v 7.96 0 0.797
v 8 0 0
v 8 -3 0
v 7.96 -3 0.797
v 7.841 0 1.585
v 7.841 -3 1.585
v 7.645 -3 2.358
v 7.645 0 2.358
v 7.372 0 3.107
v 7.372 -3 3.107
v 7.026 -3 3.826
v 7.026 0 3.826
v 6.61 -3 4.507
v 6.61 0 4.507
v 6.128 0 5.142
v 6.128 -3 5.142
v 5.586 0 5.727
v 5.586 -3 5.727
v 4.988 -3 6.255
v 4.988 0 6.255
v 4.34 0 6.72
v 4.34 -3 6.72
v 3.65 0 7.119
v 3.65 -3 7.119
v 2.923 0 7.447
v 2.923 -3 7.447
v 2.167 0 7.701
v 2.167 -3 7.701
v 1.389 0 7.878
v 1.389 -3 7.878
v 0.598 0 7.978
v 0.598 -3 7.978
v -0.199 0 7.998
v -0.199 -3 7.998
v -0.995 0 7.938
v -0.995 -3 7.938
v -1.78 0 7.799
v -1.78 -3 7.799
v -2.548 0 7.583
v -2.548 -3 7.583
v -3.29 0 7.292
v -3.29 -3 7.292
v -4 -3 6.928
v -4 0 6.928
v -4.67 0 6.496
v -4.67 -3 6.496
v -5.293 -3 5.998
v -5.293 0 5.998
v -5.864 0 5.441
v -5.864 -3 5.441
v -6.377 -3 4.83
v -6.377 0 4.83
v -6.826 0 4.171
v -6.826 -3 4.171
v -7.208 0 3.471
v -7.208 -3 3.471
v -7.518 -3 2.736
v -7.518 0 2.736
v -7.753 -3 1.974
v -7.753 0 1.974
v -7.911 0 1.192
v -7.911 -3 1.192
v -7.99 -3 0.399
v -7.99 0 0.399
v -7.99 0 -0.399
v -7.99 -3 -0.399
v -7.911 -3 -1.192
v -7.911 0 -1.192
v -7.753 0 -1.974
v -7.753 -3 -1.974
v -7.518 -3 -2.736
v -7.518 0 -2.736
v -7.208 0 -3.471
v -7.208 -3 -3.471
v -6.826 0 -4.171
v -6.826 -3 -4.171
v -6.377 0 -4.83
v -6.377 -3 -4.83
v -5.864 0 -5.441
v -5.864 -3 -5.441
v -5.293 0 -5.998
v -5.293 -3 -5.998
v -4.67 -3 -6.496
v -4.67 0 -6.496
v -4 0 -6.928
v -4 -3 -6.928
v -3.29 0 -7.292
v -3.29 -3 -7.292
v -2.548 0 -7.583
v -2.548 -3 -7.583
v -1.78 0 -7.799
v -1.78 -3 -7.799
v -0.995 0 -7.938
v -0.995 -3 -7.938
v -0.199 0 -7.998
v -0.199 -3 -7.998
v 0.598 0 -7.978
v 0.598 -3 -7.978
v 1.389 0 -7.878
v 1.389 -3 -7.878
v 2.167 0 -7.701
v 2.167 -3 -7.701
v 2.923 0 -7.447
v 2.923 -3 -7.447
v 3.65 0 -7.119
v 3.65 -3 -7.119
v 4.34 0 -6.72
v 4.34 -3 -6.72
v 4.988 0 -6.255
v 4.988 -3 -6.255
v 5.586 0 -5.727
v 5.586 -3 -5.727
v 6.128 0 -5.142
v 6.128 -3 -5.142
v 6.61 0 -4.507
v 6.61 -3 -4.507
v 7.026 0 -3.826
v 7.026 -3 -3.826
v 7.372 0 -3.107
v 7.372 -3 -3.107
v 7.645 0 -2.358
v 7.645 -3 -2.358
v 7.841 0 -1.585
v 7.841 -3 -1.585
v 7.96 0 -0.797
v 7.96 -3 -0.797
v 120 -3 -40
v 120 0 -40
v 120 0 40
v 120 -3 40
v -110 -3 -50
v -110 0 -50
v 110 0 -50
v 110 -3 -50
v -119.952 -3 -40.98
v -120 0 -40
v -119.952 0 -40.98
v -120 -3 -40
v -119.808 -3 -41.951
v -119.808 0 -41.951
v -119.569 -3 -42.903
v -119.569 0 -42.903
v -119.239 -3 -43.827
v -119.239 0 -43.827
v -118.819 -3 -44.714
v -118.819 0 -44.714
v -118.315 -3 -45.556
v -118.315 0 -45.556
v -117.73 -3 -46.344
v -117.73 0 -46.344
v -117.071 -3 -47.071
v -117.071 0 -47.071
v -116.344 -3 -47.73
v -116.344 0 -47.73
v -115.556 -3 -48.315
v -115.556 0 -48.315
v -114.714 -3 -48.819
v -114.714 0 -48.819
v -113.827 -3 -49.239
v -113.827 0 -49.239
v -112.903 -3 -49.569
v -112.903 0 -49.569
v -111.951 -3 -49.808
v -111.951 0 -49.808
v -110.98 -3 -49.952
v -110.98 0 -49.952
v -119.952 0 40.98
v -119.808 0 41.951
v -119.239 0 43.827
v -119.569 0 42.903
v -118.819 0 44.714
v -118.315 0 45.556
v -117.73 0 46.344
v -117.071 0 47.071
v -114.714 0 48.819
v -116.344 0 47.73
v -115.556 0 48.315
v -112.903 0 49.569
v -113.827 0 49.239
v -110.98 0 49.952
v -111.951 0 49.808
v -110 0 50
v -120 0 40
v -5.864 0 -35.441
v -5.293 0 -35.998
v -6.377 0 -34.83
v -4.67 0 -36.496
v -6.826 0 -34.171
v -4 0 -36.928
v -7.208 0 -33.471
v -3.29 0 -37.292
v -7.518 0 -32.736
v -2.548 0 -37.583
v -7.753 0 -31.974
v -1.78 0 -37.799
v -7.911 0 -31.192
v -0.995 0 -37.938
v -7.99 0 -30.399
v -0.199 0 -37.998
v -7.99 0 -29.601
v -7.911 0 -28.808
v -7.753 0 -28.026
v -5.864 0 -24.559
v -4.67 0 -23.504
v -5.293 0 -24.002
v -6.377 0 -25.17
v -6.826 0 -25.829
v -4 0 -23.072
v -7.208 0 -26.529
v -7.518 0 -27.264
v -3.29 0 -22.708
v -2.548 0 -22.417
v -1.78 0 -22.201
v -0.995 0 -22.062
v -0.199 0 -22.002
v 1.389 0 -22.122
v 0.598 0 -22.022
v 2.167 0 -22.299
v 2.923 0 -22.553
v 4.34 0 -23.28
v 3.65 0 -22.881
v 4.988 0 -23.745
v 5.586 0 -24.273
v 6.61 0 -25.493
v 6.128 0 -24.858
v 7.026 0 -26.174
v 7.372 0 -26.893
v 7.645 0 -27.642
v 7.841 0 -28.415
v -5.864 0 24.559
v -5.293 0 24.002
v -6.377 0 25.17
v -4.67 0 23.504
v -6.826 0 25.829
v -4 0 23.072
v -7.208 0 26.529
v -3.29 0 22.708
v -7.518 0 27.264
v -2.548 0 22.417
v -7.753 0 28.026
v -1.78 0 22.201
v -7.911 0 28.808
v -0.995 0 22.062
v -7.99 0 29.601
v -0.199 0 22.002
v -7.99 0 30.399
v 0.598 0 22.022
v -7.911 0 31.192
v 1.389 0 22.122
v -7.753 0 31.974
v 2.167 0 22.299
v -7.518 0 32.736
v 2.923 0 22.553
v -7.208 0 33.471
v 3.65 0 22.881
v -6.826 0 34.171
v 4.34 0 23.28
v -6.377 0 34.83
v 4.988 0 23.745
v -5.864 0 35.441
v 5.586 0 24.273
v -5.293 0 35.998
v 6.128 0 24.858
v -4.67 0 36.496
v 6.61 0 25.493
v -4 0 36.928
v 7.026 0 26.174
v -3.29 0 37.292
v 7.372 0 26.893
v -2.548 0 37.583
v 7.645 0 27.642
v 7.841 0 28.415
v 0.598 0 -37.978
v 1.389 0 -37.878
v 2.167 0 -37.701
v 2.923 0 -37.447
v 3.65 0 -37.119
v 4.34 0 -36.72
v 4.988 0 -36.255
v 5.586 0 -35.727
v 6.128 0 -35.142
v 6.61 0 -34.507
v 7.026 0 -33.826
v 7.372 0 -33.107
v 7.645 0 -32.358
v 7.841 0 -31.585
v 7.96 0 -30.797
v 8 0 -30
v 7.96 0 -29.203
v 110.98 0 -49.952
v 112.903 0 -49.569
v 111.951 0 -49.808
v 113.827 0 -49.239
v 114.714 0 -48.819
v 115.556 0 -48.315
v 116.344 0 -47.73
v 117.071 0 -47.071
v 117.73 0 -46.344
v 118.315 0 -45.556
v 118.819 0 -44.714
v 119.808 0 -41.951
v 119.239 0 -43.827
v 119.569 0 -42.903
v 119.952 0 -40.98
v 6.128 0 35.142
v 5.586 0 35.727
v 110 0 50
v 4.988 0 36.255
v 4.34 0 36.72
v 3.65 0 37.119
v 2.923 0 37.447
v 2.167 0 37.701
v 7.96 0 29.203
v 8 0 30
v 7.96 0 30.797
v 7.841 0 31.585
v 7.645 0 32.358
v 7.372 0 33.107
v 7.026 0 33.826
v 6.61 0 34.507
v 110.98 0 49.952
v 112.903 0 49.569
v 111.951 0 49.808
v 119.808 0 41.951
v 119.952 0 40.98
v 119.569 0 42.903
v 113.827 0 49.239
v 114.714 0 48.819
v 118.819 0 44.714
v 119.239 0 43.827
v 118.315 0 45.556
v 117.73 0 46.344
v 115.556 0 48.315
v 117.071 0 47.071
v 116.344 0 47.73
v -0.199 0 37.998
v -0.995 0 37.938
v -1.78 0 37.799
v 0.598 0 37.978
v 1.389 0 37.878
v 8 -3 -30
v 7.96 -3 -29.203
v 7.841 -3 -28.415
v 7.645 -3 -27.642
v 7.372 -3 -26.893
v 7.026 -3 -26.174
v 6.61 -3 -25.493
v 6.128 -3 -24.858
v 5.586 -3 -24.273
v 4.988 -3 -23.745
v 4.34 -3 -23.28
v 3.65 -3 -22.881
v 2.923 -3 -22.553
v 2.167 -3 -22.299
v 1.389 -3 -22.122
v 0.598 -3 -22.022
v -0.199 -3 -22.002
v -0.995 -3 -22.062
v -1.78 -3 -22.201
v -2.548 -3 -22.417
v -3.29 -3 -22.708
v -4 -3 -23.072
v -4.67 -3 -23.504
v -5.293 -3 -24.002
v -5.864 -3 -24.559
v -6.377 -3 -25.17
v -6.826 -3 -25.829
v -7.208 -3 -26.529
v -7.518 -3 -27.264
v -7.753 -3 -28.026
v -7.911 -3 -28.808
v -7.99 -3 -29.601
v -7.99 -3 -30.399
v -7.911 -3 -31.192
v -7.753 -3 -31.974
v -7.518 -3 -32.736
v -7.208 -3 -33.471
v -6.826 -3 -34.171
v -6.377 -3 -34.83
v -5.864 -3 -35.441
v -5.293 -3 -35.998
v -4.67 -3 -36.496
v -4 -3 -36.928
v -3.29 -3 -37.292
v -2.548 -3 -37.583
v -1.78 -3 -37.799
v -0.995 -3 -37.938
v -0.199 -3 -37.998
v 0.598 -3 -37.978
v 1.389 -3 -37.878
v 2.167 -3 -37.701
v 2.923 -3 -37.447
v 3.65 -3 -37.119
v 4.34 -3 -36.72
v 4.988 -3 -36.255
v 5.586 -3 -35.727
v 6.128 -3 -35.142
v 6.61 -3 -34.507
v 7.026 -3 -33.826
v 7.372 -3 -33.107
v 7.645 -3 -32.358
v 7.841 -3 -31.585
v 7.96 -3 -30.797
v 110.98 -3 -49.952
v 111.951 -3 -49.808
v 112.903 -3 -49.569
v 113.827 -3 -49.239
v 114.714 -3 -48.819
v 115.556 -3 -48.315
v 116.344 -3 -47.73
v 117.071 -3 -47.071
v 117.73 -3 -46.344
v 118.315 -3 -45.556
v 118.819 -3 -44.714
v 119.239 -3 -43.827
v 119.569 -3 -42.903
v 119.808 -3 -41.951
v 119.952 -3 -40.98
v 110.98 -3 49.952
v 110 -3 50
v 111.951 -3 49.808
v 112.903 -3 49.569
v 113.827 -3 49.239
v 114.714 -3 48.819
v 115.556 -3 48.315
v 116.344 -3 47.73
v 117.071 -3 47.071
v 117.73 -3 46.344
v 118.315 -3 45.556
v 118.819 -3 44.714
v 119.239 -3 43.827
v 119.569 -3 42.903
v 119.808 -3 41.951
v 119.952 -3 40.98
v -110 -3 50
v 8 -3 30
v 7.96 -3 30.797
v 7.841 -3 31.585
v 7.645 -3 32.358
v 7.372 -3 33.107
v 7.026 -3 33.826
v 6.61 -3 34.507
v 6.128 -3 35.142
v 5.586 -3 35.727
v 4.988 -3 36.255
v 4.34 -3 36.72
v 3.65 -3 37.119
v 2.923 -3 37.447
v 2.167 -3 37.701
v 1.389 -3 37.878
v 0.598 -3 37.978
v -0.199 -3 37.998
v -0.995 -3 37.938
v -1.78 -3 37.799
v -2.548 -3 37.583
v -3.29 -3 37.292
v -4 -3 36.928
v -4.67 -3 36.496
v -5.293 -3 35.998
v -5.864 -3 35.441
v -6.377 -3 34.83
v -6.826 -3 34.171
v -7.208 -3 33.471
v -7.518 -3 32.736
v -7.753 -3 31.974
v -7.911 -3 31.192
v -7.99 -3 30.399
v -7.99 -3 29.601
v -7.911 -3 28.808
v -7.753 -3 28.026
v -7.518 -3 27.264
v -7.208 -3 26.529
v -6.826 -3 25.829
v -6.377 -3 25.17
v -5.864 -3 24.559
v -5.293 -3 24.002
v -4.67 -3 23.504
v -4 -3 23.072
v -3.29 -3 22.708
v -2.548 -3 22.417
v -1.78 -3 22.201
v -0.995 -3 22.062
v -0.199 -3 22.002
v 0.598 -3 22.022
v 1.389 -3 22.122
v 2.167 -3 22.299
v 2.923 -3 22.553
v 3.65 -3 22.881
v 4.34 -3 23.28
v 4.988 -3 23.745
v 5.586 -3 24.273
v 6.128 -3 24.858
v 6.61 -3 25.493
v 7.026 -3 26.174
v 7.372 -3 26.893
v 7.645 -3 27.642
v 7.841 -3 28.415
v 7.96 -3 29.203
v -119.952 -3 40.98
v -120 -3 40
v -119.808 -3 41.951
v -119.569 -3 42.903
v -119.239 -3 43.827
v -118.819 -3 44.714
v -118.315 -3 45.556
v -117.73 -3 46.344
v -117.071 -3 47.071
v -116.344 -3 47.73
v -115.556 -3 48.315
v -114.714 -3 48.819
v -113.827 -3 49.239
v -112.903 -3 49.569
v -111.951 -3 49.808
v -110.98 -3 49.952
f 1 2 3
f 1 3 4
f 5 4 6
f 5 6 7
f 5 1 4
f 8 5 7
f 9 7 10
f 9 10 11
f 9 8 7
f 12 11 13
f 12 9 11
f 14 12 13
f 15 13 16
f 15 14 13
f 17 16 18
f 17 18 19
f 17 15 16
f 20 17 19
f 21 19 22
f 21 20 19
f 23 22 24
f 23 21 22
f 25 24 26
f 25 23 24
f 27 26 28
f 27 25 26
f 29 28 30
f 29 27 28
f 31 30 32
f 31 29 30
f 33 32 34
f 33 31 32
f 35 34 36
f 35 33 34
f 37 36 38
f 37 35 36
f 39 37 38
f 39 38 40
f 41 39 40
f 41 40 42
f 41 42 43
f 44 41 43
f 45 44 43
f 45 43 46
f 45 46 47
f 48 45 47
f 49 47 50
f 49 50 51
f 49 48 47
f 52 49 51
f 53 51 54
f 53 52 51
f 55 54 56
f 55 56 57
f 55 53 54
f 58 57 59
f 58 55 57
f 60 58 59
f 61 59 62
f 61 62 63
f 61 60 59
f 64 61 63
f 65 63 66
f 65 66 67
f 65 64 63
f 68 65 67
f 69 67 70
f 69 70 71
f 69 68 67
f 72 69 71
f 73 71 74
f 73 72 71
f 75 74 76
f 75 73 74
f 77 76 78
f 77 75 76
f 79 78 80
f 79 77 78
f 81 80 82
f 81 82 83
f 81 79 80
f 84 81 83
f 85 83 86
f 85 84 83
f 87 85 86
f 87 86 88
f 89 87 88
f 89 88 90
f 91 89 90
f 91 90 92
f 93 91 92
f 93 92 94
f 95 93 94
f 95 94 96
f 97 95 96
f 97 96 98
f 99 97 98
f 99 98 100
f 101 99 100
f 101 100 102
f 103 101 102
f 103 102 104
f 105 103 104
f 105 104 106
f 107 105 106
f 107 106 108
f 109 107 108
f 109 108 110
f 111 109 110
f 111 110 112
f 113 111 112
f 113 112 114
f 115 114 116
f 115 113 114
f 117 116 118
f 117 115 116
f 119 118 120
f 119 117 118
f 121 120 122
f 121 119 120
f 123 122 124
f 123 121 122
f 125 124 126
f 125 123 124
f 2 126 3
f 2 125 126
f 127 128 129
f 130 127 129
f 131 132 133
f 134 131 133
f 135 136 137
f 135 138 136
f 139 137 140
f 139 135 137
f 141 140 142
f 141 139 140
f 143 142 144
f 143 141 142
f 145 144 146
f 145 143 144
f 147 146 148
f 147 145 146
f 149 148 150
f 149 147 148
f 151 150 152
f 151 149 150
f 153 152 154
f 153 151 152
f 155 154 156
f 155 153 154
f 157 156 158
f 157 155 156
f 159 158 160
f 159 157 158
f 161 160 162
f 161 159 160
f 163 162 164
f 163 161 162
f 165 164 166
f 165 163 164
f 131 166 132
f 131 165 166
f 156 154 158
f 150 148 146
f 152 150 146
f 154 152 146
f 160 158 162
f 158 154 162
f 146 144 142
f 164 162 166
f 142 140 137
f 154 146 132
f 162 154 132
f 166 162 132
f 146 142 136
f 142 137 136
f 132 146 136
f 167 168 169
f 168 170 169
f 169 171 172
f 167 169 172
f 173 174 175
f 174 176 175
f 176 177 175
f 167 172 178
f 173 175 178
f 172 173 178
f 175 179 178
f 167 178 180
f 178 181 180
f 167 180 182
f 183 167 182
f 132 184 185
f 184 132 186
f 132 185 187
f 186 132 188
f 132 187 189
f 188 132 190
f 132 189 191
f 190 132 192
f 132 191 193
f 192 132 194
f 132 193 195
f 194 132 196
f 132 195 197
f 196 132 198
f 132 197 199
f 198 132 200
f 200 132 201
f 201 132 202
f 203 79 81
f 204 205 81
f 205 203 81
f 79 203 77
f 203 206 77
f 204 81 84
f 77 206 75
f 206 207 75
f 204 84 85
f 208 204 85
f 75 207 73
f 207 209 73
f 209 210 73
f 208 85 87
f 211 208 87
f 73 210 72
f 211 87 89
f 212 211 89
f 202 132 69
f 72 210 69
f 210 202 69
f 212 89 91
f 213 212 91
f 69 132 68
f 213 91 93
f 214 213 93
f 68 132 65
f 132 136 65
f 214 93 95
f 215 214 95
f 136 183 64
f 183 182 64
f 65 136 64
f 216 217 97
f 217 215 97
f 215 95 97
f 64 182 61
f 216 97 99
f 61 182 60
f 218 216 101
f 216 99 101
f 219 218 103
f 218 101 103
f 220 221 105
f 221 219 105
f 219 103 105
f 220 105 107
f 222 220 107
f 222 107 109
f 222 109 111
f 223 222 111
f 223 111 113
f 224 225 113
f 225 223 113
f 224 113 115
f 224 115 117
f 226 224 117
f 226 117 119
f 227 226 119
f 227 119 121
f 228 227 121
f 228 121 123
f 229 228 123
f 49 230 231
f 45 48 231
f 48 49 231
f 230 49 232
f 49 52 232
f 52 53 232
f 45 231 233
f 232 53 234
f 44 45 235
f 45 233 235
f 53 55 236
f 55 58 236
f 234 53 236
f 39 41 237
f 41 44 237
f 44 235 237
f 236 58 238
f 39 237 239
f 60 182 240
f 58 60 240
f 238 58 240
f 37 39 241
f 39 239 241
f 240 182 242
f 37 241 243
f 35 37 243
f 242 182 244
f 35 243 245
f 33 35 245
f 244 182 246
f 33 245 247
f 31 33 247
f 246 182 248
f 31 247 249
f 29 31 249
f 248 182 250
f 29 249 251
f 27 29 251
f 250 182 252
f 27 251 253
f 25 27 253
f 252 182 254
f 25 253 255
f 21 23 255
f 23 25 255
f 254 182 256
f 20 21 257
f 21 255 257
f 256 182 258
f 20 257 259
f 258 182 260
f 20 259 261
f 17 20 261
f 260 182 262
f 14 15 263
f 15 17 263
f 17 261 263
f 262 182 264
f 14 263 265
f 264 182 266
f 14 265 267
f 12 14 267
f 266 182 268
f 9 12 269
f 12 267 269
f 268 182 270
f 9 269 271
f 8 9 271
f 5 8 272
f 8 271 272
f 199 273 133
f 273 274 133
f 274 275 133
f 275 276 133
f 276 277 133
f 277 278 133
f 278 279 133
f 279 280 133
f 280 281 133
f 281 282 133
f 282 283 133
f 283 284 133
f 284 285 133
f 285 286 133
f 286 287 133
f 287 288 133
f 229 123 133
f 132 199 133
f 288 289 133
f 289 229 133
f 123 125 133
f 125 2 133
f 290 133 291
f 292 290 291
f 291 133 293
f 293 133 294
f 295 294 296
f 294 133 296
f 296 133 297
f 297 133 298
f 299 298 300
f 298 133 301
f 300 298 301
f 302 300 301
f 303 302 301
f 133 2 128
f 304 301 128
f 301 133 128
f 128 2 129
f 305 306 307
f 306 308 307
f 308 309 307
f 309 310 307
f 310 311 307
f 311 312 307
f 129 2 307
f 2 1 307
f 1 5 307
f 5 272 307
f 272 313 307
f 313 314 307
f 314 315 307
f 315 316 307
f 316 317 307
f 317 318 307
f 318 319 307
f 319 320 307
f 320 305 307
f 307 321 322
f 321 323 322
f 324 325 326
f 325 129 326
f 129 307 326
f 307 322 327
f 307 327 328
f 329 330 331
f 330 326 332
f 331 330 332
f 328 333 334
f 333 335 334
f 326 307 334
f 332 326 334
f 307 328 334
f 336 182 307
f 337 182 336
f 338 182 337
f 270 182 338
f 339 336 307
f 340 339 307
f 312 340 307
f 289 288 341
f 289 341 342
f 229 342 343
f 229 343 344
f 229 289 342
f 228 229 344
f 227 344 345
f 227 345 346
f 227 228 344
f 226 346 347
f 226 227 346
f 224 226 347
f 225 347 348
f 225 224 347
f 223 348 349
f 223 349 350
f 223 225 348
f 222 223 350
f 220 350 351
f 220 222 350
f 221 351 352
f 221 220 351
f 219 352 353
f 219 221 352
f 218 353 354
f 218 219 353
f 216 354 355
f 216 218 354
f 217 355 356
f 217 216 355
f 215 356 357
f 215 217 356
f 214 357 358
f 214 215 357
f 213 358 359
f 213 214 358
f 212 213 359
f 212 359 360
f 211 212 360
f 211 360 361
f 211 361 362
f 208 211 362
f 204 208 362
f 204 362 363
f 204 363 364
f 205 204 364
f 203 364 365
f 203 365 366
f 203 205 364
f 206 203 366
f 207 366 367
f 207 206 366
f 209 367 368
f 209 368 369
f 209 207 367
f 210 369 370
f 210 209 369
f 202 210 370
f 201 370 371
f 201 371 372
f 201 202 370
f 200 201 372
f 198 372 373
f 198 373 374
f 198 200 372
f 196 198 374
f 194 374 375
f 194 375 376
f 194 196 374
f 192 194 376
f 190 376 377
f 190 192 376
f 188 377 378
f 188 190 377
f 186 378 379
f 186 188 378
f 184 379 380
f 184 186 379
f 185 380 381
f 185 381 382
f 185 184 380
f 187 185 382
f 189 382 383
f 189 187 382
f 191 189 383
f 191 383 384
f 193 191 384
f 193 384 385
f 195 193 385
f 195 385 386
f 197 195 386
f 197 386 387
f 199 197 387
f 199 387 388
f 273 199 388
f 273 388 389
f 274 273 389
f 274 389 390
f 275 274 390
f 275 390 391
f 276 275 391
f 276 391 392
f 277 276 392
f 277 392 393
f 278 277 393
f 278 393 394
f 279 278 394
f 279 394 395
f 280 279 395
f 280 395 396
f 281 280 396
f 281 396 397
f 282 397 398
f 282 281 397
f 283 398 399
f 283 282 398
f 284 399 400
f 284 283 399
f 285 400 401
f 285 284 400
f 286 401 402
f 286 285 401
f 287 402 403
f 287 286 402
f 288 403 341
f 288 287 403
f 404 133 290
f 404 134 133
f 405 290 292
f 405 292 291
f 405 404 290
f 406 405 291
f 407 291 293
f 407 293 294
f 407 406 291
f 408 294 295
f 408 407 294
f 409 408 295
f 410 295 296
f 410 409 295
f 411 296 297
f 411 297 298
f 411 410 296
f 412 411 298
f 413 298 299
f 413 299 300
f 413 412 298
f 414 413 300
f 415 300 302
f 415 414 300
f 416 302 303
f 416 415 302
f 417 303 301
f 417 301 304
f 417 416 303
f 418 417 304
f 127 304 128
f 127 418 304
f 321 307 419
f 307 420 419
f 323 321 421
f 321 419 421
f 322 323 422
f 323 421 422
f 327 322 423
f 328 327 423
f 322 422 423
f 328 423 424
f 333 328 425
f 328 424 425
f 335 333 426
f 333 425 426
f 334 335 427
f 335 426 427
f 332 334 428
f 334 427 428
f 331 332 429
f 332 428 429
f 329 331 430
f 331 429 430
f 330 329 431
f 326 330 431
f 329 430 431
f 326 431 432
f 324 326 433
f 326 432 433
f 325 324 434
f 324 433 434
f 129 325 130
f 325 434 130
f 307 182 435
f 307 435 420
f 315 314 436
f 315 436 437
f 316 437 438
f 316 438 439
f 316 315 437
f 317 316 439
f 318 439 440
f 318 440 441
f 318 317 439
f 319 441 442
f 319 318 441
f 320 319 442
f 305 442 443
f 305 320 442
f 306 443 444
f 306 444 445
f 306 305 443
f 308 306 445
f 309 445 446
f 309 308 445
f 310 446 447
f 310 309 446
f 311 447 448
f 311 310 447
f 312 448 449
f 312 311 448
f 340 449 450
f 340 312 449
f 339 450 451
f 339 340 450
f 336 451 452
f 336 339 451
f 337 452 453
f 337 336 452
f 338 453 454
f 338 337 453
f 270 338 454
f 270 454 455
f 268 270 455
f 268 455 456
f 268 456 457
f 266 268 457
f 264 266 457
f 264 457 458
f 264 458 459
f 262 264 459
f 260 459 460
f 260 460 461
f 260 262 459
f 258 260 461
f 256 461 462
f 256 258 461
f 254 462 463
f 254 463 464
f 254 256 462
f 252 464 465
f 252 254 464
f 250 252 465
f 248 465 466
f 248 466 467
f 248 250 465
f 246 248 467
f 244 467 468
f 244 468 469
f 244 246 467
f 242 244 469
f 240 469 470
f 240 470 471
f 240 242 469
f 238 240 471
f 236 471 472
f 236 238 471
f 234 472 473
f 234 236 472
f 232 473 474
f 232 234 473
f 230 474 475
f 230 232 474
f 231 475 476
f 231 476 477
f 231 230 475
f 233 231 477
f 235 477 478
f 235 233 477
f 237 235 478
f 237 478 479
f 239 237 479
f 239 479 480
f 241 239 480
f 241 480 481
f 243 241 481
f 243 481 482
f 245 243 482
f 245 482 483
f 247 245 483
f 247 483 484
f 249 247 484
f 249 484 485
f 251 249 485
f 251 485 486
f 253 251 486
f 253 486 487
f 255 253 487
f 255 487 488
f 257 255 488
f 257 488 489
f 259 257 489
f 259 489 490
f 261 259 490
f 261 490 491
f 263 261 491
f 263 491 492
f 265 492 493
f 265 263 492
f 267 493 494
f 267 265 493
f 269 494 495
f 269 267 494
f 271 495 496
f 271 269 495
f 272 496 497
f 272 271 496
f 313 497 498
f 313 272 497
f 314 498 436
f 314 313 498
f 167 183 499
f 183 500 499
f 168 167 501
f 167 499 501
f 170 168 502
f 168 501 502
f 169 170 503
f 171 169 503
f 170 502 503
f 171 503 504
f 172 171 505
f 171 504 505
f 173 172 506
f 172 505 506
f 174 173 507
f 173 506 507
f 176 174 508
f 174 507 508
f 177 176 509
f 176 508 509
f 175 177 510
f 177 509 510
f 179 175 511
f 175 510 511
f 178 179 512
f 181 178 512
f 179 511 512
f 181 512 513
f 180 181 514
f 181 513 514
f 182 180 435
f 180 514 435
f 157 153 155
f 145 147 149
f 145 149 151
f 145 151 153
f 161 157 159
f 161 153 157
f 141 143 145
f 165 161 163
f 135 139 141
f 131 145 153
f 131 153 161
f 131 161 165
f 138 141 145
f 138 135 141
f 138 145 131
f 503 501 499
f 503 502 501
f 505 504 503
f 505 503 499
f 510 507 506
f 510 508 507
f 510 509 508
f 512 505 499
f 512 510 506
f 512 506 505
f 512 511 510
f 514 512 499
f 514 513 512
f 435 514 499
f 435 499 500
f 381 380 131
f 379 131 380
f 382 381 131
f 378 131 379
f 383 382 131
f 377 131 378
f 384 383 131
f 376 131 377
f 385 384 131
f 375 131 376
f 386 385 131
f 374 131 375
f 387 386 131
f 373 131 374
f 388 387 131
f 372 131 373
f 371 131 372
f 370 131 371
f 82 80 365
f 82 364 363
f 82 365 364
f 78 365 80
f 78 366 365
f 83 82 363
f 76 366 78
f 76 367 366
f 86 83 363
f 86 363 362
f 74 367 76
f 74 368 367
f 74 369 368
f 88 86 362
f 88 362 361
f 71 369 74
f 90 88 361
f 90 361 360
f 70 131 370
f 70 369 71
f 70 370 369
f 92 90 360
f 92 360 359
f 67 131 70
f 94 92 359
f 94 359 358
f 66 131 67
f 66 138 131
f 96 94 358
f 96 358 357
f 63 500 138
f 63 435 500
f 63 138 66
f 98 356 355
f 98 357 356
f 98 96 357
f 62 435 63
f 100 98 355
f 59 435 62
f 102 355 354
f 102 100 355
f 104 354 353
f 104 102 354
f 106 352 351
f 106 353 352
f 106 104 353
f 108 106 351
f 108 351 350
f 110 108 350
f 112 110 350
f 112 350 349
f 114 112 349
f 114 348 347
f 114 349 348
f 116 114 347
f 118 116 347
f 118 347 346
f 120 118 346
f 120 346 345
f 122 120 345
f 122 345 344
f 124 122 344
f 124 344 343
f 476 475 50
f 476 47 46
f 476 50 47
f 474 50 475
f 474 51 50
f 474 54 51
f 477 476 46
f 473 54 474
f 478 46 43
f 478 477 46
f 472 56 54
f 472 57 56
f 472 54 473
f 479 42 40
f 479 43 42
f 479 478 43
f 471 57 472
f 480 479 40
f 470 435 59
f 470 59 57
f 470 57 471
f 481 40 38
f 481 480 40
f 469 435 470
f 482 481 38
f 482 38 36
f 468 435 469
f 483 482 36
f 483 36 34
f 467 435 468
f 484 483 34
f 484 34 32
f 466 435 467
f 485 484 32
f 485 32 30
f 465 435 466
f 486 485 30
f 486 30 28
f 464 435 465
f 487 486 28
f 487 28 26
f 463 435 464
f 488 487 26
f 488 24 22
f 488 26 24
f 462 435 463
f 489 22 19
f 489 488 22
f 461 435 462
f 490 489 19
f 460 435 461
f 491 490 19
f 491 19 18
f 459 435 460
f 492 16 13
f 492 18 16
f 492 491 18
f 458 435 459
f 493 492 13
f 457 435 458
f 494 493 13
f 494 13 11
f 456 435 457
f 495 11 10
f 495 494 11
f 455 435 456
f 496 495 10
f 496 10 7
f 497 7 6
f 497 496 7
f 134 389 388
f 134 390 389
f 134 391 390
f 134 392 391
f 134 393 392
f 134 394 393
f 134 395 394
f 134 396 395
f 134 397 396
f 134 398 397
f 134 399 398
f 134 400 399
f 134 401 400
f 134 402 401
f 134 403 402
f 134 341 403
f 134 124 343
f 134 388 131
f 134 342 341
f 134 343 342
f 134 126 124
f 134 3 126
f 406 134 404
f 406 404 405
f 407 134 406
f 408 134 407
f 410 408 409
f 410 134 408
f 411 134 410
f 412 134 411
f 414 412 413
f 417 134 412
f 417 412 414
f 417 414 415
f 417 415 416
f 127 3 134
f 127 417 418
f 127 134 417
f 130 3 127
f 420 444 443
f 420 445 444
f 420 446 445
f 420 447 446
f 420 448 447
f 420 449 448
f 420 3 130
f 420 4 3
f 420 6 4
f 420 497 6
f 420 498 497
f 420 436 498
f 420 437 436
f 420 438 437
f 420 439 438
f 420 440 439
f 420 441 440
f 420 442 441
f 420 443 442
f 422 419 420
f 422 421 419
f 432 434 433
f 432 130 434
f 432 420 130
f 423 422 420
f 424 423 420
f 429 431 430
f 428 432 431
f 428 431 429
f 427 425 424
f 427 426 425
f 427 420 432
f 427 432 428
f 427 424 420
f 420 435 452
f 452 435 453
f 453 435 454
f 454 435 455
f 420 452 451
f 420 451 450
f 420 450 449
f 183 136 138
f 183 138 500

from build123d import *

# Parameters (mm, degrees)
F0_W     = 240
F0_H     = 100
F0_R     = 8
F1_DEPTH = 3
F2_R     = 10


with BuildPart() as f1:
    # F0 (on Front) → F1 (new body)
    with BuildSketch(Plane.XZ):
        Rectangle(F0_W, F0_H)
        with Locations((0, -30)):
            Circle(F0_R, mode=Mode.SUBTRACT)
        Circle(F0_R, mode=Mode.SUBTRACT)
        with Locations((0, 30)):
            Circle(F0_R, mode=Mode.SUBTRACT)
    extrude(amount=F1_DEPTH)

    # F2
    f2_edges = [f1.edges().sort_by_distance(p)[0] for p in [
        (-120, -1.5, 50),
        (-120, -1.5, -50),
        (120, -1.5, 50),
        (120, -1.5, -50),
    ]]
    fillet(f2_edges, radius=F2_R)


solid = f1.part
